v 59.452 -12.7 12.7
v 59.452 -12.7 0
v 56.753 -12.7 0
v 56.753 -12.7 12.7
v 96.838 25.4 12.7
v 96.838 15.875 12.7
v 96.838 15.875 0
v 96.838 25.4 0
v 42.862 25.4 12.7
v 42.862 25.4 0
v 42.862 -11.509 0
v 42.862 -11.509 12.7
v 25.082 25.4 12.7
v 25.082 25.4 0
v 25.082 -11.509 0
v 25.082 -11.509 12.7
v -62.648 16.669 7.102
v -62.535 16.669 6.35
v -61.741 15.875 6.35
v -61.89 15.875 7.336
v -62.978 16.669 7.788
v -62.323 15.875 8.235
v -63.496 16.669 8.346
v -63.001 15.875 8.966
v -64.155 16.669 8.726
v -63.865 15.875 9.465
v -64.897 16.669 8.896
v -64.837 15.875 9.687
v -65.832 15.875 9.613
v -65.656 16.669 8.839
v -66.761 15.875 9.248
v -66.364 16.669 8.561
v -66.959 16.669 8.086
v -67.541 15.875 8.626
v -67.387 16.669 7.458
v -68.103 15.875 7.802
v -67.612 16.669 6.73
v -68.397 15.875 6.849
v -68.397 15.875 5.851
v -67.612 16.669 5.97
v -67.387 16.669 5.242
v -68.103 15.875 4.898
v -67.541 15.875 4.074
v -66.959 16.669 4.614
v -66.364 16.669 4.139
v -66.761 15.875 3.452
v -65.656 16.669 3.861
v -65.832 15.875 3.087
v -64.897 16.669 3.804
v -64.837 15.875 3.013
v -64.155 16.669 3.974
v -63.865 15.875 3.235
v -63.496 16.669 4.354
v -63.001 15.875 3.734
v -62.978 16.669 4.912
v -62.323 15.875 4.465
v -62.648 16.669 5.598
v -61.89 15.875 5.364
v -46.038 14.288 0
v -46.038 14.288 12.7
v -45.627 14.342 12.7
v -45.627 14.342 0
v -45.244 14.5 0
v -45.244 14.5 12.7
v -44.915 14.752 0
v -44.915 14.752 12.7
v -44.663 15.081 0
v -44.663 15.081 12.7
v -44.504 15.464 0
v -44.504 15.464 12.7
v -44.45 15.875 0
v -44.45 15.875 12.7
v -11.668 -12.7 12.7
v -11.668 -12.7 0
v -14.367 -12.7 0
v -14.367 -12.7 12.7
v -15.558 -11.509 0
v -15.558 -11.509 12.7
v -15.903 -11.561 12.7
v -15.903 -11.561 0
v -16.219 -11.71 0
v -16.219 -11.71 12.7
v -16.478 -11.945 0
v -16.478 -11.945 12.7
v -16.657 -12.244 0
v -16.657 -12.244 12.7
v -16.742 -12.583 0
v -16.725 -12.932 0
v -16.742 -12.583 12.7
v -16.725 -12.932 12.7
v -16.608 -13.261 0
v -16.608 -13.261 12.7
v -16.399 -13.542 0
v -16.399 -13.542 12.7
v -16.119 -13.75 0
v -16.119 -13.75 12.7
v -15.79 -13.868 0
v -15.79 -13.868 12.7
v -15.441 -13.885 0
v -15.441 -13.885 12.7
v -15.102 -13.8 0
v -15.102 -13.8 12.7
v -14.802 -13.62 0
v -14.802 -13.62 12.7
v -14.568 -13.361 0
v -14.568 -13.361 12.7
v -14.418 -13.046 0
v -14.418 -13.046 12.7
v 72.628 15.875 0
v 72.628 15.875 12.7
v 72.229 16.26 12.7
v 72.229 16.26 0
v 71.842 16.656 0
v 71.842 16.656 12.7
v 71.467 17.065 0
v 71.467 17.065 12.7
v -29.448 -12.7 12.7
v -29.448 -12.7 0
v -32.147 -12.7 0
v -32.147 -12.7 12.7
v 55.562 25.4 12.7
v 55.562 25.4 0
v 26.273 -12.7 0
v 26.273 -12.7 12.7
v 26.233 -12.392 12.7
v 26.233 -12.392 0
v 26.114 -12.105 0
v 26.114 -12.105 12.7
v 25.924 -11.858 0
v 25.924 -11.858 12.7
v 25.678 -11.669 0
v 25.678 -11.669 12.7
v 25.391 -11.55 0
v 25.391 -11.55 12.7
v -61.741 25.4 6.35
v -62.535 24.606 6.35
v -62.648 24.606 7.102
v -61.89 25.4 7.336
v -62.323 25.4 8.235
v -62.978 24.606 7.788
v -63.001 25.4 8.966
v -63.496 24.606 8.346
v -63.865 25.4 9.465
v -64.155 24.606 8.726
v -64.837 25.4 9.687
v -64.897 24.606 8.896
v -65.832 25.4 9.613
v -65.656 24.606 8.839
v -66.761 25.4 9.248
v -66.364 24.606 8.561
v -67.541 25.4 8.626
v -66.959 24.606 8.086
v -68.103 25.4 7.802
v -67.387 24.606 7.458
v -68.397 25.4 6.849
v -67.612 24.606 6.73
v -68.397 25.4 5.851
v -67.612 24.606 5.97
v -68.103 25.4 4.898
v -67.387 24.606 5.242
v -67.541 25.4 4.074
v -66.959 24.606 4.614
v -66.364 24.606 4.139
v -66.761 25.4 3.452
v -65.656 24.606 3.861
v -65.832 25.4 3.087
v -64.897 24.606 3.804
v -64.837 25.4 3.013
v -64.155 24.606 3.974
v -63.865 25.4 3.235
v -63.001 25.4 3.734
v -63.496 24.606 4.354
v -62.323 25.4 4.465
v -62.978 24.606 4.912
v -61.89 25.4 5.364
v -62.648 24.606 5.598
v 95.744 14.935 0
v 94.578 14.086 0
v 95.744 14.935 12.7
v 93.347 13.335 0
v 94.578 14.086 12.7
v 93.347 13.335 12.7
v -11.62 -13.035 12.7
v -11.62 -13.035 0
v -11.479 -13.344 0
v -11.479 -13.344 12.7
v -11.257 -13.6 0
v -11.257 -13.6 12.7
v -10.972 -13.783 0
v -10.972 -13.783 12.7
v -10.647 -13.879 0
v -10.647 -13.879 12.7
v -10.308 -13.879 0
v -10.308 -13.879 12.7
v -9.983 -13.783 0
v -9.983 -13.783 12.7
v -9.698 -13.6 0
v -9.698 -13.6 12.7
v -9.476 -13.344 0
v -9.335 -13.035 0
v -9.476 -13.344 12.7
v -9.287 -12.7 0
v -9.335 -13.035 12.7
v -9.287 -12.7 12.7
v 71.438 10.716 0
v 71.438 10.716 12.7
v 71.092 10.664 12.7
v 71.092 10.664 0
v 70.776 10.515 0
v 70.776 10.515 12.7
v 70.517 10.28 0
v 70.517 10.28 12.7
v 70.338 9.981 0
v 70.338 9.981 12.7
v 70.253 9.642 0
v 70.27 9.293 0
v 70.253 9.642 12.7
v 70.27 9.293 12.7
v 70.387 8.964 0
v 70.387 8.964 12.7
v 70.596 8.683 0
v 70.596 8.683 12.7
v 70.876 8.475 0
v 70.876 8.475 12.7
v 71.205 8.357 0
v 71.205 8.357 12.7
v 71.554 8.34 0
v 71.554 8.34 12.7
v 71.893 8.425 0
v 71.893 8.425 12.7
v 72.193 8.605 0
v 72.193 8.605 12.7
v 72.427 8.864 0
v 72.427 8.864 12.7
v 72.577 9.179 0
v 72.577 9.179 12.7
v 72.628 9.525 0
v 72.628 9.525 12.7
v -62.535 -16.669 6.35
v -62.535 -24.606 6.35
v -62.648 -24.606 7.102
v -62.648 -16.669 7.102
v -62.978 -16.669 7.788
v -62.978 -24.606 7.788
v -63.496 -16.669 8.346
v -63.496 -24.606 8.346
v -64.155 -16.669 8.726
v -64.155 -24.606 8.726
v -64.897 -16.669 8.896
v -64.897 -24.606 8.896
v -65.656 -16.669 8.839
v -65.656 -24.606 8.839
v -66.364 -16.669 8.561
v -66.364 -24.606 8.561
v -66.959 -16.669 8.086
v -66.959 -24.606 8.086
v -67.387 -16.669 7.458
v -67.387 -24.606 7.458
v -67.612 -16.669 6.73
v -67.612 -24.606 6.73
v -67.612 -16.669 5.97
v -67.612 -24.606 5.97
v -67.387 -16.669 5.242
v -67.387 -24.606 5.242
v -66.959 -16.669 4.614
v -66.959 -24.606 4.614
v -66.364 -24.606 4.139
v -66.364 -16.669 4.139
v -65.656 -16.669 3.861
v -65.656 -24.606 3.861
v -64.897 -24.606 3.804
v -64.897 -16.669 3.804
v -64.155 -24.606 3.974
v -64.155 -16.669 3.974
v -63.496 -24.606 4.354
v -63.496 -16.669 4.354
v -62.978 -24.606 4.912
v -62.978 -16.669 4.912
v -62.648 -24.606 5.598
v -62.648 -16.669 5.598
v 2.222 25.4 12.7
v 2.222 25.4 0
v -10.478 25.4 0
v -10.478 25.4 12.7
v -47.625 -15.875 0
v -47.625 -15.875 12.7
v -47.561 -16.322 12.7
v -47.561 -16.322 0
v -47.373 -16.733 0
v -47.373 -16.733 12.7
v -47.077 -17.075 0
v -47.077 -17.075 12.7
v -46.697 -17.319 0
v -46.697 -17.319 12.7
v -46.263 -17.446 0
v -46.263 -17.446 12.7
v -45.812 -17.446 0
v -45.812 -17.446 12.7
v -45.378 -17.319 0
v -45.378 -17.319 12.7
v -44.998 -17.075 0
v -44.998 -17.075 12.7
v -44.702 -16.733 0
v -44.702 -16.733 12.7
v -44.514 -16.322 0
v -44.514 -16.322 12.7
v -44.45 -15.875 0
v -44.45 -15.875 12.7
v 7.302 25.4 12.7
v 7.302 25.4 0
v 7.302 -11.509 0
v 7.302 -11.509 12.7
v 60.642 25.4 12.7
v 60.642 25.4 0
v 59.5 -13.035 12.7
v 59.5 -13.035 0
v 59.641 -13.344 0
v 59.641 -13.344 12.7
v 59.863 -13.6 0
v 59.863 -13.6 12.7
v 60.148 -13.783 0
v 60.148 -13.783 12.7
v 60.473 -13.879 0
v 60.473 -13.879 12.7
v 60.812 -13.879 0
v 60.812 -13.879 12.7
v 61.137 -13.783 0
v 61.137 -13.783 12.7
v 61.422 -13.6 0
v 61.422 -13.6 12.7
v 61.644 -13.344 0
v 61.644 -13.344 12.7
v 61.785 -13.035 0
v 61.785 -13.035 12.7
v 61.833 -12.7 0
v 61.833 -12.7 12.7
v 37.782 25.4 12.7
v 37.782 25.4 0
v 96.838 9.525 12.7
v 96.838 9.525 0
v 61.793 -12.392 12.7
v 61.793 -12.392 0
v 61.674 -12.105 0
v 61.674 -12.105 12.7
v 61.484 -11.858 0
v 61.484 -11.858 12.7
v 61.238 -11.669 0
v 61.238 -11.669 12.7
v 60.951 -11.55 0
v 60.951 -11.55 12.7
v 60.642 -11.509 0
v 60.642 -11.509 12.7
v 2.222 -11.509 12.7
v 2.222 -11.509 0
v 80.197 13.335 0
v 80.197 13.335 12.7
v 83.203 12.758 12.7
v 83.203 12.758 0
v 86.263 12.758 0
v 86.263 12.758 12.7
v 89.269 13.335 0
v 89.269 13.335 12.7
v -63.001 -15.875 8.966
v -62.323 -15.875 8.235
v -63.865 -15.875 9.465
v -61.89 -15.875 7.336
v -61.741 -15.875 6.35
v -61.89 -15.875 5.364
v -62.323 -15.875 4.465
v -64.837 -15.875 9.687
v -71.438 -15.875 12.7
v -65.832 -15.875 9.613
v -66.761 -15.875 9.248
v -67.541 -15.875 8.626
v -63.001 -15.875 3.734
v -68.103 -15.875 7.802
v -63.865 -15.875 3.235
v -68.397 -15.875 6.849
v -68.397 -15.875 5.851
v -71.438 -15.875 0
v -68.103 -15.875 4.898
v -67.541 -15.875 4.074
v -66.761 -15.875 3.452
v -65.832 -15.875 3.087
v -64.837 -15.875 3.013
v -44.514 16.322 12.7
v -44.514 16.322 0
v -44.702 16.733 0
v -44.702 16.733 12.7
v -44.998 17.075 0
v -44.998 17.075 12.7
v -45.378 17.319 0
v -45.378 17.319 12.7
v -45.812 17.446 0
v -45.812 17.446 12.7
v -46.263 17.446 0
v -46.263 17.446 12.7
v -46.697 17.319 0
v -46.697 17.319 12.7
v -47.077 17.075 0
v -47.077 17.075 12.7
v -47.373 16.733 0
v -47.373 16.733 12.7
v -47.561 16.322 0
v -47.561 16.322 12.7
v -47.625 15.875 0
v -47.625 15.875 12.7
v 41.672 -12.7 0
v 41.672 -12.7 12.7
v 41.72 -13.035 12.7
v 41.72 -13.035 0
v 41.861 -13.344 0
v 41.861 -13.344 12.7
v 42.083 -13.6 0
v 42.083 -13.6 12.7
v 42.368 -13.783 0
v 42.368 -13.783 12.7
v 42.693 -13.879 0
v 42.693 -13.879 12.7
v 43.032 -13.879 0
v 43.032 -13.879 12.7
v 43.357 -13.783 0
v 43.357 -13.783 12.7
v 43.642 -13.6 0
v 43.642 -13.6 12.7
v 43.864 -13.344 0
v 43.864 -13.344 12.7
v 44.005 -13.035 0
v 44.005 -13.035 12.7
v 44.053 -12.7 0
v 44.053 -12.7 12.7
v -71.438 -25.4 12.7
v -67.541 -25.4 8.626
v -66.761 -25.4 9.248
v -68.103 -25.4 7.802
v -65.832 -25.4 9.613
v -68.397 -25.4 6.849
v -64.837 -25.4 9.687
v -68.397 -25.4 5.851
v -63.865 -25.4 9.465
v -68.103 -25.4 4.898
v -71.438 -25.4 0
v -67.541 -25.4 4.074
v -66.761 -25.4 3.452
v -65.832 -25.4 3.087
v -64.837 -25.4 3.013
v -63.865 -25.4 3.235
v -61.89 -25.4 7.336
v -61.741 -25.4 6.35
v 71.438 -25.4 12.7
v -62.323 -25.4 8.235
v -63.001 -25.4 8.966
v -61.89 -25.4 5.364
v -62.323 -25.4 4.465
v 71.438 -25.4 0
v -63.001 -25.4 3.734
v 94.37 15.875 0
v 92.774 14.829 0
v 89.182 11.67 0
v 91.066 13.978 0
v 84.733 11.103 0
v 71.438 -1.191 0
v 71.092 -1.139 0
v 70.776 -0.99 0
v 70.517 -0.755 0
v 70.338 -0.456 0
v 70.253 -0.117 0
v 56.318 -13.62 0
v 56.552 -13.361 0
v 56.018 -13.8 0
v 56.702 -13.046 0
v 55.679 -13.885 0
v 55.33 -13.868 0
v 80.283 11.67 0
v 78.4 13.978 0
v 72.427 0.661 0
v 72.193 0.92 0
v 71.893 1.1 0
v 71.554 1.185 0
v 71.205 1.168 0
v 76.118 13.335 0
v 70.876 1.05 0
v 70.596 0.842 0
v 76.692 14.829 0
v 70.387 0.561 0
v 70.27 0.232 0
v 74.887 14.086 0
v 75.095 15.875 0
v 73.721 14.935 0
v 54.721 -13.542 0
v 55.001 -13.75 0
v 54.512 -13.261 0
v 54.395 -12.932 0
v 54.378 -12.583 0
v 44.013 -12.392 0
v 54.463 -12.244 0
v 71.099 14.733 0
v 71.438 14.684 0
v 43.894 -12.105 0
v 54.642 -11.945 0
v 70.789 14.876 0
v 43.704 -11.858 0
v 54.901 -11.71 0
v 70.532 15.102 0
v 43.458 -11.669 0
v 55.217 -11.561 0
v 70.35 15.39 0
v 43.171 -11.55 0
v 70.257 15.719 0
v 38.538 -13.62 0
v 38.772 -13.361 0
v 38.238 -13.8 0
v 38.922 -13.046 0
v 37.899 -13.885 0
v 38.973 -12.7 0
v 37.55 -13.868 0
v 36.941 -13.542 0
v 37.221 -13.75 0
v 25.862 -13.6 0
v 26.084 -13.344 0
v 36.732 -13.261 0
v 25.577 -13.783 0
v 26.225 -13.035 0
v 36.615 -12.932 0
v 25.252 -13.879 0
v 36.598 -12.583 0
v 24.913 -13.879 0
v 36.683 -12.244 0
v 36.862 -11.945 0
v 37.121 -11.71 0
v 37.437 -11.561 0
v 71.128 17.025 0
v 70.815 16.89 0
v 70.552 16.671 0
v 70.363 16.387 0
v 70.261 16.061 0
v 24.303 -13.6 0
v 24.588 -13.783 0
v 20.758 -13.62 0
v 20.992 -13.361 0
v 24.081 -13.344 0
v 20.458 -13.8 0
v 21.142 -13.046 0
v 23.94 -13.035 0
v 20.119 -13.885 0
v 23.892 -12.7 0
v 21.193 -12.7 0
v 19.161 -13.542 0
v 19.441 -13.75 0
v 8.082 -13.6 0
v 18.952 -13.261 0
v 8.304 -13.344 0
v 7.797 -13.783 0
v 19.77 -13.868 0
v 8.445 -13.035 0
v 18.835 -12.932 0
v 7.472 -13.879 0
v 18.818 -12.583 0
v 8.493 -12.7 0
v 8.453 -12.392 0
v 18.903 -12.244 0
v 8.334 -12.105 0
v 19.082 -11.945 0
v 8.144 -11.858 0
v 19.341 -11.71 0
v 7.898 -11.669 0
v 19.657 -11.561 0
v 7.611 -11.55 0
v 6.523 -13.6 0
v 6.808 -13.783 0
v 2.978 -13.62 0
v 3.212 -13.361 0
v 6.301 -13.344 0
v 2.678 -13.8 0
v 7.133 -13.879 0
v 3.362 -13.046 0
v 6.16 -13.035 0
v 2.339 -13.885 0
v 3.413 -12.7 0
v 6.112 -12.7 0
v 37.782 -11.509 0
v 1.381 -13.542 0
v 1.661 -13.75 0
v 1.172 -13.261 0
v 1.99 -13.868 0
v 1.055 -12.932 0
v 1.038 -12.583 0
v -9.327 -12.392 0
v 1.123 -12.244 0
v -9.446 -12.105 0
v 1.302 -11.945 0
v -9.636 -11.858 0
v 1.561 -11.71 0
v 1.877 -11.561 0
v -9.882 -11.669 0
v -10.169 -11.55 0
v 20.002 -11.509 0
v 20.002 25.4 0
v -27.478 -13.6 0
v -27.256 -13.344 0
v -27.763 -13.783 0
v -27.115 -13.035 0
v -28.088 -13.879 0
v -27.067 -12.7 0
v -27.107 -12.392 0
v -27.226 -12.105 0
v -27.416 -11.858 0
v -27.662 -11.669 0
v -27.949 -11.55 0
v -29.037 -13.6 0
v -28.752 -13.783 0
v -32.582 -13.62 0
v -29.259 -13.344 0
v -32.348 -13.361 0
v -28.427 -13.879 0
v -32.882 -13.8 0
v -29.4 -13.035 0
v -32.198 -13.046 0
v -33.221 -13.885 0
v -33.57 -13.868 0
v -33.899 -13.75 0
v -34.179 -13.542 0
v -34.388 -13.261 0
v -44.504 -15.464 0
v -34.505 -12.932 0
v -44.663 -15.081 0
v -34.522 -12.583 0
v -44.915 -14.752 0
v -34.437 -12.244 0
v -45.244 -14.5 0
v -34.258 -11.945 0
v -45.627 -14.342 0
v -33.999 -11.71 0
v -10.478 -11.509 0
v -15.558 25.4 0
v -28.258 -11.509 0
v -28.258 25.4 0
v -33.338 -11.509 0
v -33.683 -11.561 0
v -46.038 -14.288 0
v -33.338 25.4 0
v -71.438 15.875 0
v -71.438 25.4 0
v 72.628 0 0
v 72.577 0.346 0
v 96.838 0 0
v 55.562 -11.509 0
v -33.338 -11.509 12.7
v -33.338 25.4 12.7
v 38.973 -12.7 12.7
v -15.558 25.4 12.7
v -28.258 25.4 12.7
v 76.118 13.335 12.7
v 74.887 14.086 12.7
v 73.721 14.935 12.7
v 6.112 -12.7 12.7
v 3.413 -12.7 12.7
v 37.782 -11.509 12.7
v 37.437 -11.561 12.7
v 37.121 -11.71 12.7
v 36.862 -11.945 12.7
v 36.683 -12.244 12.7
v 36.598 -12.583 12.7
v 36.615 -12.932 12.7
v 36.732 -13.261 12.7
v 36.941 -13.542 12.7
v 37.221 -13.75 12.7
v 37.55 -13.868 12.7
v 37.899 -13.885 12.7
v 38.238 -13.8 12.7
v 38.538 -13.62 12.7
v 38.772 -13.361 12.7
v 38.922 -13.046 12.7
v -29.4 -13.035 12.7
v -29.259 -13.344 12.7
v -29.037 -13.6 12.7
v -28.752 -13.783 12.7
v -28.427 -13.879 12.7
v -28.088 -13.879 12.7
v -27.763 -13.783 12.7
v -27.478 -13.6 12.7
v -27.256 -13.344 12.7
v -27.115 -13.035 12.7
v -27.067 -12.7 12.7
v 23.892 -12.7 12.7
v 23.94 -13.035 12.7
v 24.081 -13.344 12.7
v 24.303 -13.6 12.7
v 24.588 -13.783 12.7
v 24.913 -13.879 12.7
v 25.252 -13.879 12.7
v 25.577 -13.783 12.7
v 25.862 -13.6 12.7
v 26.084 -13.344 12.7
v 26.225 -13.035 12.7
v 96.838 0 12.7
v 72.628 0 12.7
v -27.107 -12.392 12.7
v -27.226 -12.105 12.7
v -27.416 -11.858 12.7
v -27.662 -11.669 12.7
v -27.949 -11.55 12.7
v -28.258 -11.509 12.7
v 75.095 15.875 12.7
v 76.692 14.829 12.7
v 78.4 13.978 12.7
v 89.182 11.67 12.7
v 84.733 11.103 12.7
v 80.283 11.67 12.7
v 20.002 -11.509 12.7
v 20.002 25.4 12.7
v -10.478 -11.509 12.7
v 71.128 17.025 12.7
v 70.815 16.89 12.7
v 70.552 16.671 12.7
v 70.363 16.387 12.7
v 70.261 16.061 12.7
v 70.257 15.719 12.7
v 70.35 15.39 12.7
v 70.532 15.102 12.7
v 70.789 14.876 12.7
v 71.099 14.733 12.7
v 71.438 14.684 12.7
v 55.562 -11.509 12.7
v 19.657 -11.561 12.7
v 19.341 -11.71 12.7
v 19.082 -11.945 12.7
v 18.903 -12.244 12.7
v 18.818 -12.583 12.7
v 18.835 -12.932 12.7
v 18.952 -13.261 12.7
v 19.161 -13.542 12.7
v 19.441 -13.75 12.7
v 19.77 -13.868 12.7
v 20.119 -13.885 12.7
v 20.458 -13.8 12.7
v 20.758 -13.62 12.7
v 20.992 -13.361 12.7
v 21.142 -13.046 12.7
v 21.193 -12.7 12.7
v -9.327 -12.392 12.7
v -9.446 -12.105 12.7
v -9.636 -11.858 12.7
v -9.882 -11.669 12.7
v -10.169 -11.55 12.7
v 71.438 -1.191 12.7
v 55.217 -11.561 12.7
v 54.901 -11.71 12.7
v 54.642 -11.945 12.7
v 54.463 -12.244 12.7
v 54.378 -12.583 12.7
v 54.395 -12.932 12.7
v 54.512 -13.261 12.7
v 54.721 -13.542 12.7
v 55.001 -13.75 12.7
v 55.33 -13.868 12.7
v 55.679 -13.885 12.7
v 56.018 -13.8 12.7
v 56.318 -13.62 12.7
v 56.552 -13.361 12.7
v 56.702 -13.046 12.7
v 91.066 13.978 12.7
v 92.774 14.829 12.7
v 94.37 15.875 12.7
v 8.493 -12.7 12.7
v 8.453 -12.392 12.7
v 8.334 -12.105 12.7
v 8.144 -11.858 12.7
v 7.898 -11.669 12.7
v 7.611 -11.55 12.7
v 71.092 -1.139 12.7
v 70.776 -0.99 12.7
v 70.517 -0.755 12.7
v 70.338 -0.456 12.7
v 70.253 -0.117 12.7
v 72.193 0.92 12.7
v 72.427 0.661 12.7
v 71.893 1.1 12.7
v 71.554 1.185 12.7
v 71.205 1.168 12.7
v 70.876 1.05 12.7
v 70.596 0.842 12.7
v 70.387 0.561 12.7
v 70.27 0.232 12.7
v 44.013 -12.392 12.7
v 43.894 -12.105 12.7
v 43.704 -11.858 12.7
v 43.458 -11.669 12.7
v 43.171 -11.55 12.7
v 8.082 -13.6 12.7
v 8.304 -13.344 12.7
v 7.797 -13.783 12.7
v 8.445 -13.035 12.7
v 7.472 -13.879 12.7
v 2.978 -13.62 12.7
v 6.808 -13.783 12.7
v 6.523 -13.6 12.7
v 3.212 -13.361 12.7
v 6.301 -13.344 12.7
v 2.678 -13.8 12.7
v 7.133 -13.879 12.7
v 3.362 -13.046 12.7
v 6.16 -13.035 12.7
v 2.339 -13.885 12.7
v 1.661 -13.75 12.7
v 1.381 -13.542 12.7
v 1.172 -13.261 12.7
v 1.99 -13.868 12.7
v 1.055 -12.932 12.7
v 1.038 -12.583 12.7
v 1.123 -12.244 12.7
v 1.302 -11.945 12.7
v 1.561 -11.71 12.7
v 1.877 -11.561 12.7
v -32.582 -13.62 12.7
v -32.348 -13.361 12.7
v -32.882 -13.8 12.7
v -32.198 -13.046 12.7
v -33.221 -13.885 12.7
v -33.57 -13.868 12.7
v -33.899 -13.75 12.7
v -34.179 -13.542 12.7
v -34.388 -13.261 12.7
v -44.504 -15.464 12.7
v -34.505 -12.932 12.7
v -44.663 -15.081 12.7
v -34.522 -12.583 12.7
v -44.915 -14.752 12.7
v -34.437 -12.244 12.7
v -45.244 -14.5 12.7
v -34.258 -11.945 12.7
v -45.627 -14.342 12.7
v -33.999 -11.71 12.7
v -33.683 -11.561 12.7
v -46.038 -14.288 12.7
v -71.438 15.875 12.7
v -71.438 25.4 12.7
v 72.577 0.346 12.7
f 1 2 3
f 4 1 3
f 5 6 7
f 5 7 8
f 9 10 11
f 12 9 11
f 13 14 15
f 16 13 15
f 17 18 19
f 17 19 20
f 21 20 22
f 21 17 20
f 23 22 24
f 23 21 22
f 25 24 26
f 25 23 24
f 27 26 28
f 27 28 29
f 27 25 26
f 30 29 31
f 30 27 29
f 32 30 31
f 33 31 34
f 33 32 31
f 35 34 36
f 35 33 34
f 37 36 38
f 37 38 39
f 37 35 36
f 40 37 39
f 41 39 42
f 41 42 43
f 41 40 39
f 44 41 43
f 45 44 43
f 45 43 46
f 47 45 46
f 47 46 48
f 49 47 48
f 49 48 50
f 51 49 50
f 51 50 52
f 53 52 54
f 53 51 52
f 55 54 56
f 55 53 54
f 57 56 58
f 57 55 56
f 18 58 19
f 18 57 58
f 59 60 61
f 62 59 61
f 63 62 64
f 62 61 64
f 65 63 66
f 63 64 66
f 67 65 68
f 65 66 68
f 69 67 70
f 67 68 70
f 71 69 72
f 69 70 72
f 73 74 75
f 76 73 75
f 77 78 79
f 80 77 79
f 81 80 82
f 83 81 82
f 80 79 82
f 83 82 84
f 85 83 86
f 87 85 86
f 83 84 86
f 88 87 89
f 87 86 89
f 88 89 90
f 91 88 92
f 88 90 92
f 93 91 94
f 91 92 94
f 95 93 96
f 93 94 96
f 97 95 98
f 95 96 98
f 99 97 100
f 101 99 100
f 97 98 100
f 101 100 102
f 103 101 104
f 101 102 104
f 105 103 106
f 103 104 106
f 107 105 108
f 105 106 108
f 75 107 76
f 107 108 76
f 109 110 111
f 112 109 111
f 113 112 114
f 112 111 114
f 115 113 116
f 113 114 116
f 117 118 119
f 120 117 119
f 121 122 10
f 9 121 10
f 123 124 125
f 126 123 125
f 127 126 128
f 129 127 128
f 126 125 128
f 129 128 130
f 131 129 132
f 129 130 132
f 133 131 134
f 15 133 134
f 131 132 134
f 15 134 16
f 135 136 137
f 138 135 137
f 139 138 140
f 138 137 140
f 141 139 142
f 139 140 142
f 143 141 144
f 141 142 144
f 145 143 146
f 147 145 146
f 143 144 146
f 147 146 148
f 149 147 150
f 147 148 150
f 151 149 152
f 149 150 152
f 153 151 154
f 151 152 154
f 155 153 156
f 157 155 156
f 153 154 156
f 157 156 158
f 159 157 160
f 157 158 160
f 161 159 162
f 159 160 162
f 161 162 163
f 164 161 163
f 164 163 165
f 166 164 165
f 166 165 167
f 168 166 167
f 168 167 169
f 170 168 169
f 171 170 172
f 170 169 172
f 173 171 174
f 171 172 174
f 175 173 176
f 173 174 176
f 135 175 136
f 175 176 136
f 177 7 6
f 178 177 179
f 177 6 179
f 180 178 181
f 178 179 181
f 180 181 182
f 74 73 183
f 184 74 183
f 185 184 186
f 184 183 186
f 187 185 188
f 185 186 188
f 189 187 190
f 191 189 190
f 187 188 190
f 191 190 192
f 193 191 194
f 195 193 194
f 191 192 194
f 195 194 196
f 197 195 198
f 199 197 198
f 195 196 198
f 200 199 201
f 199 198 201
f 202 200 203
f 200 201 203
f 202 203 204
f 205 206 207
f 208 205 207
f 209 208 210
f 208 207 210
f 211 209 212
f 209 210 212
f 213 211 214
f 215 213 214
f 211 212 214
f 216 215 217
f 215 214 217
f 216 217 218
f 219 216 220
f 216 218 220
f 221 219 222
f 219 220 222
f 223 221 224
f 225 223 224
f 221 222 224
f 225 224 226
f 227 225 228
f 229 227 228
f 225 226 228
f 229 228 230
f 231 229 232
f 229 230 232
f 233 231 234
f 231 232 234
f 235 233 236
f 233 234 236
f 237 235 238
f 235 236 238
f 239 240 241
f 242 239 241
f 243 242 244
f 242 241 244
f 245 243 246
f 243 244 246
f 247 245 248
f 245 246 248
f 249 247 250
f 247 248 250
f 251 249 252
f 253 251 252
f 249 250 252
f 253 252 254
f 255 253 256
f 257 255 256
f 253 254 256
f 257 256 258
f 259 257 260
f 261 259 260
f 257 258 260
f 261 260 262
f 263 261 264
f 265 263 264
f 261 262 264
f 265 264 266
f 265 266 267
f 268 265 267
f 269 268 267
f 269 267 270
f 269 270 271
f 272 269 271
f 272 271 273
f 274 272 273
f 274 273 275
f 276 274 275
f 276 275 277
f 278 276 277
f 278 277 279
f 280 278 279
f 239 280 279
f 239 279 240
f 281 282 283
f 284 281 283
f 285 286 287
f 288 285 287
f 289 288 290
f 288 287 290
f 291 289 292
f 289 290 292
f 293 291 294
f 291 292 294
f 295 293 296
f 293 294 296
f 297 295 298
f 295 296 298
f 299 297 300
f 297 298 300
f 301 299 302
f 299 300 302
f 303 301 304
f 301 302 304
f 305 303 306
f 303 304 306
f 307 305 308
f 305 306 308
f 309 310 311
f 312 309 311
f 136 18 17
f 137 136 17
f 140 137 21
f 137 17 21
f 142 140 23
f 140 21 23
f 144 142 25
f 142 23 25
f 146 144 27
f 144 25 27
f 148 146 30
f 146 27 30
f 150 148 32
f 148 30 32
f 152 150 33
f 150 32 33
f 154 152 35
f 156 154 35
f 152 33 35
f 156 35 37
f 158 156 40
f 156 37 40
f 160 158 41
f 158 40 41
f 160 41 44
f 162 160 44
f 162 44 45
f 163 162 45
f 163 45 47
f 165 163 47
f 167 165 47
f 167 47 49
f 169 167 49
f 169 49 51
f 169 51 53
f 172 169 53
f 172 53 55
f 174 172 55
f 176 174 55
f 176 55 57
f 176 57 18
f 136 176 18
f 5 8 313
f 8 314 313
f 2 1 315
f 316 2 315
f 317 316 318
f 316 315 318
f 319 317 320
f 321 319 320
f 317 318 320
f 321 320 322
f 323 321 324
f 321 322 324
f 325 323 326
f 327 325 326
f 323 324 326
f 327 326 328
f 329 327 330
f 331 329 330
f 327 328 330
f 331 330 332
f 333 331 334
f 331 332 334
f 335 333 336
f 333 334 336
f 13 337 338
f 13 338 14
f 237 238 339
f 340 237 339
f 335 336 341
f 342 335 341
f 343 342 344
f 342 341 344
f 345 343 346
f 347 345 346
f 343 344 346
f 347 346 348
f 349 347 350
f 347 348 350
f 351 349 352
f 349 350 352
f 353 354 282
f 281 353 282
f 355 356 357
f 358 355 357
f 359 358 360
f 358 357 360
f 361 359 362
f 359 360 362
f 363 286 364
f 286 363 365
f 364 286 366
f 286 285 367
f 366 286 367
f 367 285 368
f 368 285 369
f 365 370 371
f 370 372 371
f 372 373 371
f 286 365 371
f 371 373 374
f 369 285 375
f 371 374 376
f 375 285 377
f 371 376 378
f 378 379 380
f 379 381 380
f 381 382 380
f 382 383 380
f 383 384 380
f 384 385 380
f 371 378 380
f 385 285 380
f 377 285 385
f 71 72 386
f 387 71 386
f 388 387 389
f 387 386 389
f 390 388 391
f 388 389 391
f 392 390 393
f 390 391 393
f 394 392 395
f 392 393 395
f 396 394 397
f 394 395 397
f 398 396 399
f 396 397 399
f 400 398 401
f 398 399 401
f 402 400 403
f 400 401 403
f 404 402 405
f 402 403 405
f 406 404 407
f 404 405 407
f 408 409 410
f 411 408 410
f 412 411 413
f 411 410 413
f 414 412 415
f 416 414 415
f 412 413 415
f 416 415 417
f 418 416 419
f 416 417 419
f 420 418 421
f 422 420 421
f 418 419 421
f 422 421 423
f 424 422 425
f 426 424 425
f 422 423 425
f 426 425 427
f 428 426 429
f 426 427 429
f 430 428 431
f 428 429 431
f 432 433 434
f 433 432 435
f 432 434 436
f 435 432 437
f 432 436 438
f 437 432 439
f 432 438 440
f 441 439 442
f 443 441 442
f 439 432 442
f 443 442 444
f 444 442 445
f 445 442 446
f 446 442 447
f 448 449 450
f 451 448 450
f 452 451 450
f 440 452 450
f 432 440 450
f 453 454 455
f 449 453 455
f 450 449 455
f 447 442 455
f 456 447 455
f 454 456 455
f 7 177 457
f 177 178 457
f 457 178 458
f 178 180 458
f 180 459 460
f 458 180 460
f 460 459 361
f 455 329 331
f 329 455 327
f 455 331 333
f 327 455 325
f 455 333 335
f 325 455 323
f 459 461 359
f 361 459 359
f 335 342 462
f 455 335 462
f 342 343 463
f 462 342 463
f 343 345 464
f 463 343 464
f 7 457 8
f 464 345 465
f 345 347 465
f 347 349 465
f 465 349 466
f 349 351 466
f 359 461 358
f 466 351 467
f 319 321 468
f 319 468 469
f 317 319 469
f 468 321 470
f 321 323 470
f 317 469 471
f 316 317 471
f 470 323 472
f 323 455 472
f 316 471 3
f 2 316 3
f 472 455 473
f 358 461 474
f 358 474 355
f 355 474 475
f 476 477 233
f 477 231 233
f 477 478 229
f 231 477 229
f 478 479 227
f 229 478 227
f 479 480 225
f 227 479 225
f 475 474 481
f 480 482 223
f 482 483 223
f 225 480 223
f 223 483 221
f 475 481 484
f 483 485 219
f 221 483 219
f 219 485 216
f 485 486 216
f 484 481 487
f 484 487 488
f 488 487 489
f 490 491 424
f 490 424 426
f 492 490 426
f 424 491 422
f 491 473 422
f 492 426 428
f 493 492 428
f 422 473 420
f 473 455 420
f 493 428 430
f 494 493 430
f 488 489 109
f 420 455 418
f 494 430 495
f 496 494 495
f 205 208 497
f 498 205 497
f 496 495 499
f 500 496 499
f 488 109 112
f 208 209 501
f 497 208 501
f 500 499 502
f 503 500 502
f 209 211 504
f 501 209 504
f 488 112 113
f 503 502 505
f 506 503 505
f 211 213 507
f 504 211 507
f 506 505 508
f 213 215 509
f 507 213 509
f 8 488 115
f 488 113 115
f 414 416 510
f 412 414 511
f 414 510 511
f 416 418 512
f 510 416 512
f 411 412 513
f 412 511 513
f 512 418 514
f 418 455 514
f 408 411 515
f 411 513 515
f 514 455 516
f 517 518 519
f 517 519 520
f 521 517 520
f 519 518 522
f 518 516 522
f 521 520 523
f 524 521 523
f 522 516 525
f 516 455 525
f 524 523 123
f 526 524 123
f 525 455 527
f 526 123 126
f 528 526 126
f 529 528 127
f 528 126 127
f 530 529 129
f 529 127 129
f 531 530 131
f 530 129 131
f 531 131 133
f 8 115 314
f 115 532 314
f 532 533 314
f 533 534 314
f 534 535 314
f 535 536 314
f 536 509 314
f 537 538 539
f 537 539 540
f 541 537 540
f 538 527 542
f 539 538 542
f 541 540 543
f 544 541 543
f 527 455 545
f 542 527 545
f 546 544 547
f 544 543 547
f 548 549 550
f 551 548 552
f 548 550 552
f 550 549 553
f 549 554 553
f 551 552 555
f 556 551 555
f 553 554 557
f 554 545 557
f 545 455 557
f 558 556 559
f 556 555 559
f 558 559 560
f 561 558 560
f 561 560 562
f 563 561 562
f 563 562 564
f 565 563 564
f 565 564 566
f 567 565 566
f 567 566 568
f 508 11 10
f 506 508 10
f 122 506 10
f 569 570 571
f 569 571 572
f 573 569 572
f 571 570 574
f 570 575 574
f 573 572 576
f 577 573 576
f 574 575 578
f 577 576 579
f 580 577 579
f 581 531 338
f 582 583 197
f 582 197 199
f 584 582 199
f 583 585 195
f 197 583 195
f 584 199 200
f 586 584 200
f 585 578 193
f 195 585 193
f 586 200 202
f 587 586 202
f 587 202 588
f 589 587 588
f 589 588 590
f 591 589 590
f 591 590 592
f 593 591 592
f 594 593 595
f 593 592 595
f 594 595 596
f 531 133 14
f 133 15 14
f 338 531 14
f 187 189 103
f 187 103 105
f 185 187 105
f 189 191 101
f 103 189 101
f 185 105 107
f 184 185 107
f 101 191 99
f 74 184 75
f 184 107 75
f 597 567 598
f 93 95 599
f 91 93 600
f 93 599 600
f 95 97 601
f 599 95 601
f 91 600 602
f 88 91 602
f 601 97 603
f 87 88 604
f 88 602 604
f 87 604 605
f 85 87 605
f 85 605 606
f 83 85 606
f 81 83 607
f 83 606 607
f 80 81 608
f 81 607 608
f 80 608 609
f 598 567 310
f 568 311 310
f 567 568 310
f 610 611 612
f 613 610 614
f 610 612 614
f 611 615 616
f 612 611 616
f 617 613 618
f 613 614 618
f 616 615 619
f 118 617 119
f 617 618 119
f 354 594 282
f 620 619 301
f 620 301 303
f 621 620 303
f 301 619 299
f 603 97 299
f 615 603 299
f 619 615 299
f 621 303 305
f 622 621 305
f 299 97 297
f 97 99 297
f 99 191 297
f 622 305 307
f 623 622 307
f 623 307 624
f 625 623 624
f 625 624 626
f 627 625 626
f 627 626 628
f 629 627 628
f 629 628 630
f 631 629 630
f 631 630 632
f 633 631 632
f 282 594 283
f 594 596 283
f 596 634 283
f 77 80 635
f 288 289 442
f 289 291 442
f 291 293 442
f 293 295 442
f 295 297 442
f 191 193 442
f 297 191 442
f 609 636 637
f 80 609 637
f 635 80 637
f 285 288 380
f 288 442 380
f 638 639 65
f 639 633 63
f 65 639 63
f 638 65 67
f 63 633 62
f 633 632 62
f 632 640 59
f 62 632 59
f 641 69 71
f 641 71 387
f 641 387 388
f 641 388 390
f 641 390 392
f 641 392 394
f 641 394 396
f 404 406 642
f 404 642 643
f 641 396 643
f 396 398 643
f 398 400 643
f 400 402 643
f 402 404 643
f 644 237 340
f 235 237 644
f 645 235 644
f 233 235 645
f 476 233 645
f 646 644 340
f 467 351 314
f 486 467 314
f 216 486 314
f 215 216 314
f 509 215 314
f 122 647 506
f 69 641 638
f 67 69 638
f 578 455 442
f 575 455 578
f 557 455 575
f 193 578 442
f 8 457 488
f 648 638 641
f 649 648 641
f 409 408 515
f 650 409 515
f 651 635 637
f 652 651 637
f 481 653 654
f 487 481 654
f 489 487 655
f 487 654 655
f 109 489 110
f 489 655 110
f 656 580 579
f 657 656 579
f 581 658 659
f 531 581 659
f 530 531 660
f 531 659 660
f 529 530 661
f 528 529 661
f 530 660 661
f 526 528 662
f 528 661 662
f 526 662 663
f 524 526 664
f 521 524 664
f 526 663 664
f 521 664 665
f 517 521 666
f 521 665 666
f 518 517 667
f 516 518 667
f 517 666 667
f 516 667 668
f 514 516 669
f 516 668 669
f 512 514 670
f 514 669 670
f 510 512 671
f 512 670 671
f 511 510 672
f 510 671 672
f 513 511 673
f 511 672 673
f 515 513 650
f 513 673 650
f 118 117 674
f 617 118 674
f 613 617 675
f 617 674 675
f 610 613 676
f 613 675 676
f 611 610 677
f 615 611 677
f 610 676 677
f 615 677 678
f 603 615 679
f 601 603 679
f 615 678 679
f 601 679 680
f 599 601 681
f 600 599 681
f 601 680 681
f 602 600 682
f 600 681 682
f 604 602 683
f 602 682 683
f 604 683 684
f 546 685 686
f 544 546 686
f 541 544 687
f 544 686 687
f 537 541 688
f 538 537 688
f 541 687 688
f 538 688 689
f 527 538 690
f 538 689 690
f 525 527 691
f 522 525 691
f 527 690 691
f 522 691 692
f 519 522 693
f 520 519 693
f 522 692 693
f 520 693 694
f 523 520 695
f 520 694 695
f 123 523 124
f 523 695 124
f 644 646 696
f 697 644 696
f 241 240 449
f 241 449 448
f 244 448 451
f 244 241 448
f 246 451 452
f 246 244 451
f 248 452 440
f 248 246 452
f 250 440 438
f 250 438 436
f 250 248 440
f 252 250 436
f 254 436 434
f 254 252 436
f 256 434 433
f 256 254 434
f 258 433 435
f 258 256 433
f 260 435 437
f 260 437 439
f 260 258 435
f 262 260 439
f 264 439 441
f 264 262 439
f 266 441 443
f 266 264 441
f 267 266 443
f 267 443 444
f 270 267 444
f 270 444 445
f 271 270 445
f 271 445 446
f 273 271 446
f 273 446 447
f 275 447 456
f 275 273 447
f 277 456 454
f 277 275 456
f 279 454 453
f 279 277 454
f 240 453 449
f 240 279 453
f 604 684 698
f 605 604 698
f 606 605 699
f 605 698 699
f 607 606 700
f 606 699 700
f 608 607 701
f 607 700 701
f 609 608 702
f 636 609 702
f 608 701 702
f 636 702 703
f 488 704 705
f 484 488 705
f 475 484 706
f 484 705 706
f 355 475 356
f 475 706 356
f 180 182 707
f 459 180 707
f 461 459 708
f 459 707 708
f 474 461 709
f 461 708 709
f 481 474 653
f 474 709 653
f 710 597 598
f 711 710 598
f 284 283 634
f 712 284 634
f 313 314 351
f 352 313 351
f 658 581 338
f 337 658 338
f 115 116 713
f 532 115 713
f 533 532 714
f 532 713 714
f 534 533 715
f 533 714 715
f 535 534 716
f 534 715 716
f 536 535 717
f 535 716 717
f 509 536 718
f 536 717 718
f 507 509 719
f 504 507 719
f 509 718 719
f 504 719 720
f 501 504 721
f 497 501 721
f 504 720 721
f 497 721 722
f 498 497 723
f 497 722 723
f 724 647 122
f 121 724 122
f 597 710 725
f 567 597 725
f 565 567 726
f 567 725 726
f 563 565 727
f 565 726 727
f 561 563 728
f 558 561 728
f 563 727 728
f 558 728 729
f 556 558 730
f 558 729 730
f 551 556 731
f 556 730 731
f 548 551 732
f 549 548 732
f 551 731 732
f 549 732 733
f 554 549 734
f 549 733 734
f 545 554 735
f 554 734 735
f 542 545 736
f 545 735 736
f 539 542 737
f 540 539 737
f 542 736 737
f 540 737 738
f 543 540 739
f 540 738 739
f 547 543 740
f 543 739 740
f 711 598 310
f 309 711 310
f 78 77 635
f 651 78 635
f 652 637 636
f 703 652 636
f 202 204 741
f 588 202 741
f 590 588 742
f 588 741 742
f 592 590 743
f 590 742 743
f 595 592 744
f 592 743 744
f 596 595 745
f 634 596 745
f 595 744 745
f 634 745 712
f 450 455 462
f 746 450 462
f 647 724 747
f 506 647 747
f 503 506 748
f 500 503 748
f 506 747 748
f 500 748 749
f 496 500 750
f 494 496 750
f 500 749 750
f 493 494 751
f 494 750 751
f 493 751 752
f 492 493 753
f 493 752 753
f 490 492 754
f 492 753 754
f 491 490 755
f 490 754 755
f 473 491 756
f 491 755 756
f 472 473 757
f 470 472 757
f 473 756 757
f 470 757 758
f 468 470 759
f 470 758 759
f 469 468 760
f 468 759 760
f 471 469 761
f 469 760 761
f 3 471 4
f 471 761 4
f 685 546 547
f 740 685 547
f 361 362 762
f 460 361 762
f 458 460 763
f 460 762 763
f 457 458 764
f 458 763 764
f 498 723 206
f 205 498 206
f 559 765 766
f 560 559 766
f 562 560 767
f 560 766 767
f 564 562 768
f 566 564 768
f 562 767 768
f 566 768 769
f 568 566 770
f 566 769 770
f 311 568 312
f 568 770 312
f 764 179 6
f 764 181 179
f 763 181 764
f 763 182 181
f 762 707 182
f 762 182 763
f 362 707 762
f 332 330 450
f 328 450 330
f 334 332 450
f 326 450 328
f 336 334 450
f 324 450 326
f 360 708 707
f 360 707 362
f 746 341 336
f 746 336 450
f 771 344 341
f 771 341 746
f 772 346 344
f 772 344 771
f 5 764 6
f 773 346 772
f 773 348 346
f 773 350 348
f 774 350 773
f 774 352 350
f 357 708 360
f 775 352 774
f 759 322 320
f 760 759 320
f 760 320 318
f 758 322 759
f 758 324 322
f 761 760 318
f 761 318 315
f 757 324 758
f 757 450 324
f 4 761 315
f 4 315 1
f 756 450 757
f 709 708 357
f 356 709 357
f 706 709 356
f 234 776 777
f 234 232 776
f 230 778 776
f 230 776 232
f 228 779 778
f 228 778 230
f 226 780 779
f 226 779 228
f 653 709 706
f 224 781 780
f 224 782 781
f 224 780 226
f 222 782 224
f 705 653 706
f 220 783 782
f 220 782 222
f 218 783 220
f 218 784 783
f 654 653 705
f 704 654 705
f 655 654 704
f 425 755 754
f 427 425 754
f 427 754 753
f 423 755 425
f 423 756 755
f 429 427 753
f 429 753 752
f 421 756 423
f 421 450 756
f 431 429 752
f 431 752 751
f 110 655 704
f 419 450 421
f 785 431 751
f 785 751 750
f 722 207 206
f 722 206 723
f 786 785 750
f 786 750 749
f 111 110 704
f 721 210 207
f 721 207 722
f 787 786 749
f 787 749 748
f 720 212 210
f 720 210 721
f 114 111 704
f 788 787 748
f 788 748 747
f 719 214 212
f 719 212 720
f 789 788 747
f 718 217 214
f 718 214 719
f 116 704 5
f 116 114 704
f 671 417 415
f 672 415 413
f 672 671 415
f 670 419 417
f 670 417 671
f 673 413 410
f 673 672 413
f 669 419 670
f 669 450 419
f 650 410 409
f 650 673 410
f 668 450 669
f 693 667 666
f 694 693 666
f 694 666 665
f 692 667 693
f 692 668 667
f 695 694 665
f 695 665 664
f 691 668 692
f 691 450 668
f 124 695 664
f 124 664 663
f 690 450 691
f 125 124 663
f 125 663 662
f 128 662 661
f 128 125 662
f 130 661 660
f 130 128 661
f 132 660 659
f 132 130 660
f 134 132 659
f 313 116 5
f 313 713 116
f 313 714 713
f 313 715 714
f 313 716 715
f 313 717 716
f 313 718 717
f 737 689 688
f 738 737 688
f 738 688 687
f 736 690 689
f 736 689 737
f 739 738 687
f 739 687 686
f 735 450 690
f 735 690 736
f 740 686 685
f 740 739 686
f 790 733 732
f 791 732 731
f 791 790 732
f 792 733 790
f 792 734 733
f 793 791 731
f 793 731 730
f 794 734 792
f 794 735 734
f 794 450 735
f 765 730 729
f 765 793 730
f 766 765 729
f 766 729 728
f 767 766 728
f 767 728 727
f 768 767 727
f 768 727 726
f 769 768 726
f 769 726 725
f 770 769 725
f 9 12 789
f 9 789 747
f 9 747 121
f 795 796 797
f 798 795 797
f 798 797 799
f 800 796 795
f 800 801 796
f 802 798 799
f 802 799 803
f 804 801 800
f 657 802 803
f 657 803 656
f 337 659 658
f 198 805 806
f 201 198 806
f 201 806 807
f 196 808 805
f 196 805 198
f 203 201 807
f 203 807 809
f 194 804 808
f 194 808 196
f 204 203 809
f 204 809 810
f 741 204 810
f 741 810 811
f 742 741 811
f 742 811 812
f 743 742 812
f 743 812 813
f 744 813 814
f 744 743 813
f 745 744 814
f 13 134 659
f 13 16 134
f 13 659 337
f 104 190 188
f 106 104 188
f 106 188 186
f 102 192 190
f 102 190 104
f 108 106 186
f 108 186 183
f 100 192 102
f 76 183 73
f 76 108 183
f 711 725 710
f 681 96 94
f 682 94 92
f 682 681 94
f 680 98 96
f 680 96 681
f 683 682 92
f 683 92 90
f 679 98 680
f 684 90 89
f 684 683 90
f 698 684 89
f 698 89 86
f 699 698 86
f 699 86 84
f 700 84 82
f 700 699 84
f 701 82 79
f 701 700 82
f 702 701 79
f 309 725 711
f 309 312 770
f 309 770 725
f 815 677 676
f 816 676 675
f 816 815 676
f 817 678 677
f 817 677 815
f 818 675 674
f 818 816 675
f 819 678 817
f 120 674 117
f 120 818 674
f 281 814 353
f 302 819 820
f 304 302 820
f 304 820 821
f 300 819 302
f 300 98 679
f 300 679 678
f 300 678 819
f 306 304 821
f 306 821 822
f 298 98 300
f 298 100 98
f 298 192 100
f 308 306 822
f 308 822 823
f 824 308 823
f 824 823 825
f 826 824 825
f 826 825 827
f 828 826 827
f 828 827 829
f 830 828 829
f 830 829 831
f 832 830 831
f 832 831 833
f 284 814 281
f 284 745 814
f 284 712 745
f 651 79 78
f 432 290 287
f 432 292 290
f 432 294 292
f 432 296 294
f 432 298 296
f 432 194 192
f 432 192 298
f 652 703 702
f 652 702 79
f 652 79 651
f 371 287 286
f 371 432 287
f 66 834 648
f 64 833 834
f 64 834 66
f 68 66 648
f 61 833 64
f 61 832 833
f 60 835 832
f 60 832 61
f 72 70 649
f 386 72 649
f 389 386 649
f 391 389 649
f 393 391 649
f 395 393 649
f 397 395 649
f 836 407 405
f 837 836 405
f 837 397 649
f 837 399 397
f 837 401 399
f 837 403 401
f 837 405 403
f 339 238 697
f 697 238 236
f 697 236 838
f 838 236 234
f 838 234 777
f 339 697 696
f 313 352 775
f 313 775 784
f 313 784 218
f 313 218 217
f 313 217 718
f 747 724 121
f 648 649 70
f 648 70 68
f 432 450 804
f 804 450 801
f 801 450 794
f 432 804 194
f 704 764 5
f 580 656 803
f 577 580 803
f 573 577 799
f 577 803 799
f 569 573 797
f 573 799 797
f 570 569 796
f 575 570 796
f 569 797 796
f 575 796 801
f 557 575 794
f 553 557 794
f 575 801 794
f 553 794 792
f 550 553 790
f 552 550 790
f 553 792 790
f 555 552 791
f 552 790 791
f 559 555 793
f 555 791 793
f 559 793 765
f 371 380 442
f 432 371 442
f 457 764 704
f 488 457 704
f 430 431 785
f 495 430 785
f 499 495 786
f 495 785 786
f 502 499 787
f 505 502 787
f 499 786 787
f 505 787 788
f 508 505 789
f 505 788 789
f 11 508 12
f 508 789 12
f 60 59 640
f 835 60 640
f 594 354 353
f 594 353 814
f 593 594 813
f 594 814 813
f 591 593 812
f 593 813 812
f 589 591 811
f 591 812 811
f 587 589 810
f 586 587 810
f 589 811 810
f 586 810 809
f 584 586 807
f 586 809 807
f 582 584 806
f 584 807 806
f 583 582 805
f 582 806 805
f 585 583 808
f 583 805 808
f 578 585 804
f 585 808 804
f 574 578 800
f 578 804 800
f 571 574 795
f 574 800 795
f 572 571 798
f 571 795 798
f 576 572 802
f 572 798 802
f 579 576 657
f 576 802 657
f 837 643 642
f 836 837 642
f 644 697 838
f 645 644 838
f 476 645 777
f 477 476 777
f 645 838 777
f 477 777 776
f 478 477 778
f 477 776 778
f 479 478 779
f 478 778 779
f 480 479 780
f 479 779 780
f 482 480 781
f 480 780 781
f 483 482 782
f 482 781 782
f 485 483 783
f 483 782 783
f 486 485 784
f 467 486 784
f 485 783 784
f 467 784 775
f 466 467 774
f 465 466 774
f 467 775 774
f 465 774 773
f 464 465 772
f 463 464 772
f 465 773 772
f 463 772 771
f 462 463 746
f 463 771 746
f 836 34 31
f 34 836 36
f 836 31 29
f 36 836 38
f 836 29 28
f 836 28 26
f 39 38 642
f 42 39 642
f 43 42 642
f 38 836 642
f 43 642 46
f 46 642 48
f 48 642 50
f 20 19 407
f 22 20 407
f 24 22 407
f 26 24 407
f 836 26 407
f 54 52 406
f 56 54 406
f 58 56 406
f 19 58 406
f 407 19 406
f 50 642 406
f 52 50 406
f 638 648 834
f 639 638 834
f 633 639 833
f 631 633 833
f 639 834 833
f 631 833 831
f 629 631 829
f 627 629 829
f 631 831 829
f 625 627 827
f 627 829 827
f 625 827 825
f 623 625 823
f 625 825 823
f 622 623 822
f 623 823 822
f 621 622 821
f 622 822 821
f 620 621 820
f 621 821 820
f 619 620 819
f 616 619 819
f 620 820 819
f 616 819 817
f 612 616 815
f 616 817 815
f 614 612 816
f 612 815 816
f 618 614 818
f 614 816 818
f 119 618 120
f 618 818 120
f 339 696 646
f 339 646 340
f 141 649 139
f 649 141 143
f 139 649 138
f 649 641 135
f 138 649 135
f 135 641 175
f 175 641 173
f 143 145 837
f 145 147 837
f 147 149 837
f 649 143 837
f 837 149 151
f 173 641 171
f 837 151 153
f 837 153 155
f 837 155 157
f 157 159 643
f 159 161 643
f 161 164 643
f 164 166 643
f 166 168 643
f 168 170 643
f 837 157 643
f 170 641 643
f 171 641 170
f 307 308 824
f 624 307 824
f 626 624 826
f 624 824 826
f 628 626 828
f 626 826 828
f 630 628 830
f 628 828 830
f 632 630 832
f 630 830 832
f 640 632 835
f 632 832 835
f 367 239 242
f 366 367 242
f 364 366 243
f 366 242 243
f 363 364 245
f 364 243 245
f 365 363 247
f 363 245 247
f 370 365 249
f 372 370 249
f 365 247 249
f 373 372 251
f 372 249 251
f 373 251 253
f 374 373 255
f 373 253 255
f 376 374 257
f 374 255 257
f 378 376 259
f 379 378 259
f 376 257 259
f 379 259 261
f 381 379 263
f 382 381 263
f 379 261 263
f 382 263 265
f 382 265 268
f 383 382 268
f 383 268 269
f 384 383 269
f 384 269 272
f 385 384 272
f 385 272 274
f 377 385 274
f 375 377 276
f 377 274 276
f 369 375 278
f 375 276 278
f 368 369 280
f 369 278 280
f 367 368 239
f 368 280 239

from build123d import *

# Parameters (mm, degrees)
F0_DEPTH = 12.7
F1_R     = 2.5527
F2_DEPTH = 50.801
F3_SIZE  = 0.79375
F5_DEPTH = 12.701
F6_DEPTH = 12.7
F7_W     = 25.4
F7_H     = 12.7
F8_DEPTH = 25.4
F9_DEPTH = 12.7


# Not quite as in the source:
# - a feature names something its author has since deleted; it is built from what else it names


with BuildPart() as f0:
    # F10 (on Top) → F0 (new body)
    with BuildSketch(Plane.XY):
        Polygon((-71.4375, -15.875), (-71.4375, -25.4), (71.4375, -25.4), (71.4375, 25.4), (60.6425, 25.4), (60.6425, -12.7), (55.5625, -12.7), (55.5625, 25.4), (42.8625, 25.4), (42.8625, -12.7), (37.7825, -12.7), (37.7825, 25.4), (25.0825, 25.4), (25.0825, -12.7), (20.0025, -12.7), (20.0025, 25.4), (7.3025, 25.4), (7.3025, -12.7), (2.2225, -12.7), (2.2225, 25.4), (-10.4775, 25.4), (-10.4775, -12.7), (-15.5575, -12.7), (-15.5575, 25.4), (-28.2575, 25.4), (-28.2575, -12.7), (-33.3375, -12.7), (-33.3375, 25.4), (-71.4375, 25.4), (-71.4375, 15.875), (-46.0375, 15.875), (-46.0375, -15.875), align=None)
    extrude(amount=F0_DEPTH)

    # F1 (on face) → F2 (cut, through all)
    with BuildSketch(Plane.XZ.offset(25.4)):
        with Locations((-65.0875, 6.35)):
            Circle(F1_R)
    extrude(amount=-F2_DEPTH, mode=Mode.SUBTRACT)

    # F3
    f3_edges = [f0.edges().sort_by_distance(p)[0] for p in [
        (-67.6402, 15.875, 6.35),
        (-62.5348, 20.6375, 6.35),
        (-67.6402, 25.4, 6.35),
        (-67.6402, -25.4, 6.35),
        (-62.5348, -20.6375, 6.35),
        (-67.6402, -15.875, 6.35),
    ]]
    chamfer(f3_edges, length=F3_SIZE)

    # F4 (on face) → F5 (cut, through all)
    with BuildSketch(Plane.XY.offset(12.7)):
        with BuildLine():
            ThreePointArc((-46.0375, 14.2875), (-44.9149679849, 14.7524679849), (-44.45, 15.875))
            ThreePointArc((-44.45, 15.875), (-46.0375, 17.4625), (-47.625, 15.875))
            Line((-47.625, 15.875), (-46.0375, 15.875))
            Line((-46.0375, 15.875), (-46.0375, 14.2875))
        make_face()
        with BuildLine():
            ThreePointArc((-44.45, -15.875), (-44.9149679849, -14.7524679849), (-46.0375, -14.2875))
            Line((-46.0375, -14.2875), (-46.0375, -15.875))
            Line((-46.0375, -15.875), (-47.625, -15.875))
            ThreePointArc((-47.625, -15.875), (-46.0375, -17.4625), (-44.45, -15.875))
        make_face()
    extrude(amount=-F5_DEPTH, mode=Mode.SUBTRACT)

    # F4 (on face) → F6 (cut, through all)
    with BuildSketch(Plane.XY.offset(12.7)):
        with BuildLine():
            Line((-33.3375, -12.7), (-33.3375, -11.509375))
            ThreePointArc((-33.3375, -11.509375), (-34.1793990114, -13.5418990114), (-32.146875, -12.7))
            Line((-32.146875, -12.7), (-33.3375, -12.7))
        make_face()
        with BuildLine():
            Line((-28.2575, -12.7), (-29.448125, -12.7))
            ThreePointArc((-29.448125, -12.7), (-28.2575, -13.890625), (-27.066875, -12.7))
            ThreePointArc((-27.066875, -12.7), (-27.4156009886, -11.8581009886), (-28.2575, -11.509375))
            Line((-28.2575, -11.509375), (-28.2575, -12.7))
        make_face()
        with BuildLine():
            Line((-15.5575, -12.7), (-15.5575, -11.509375))
            ThreePointArc((-15.5575, -11.509375), (-16.3993990114, -13.5418990114), (-14.366875, -12.7))
            Line((-14.366875, -12.7), (-15.5575, -12.7))
        make_face()
        with BuildLine():
            Line((-10.4775, -12.7), (-11.668125, -12.7))
            ThreePointArc((-11.668125, -12.7), (-10.4775, -13.890625), (-9.286875, -12.7))
            ThreePointArc((-9.286875, -12.7), (-9.6356009886, -11.8581009886), (-10.4775, -11.509375))
            Line((-10.4775, -11.509375), (-10.4775, -12.7))
        make_face()
        with BuildLine():
            Line((2.2225, -12.7), (2.2225, -11.509375))
            ThreePointArc((2.2225, -11.509375), (1.3806009886, -13.5418990114), (3.413125, -12.7))
            Line((3.413125, -12.7), (2.2225, -12.7))
        make_face()
        with BuildLine():
            Line((7.3025, -12.7), (6.111875, -12.7))
            ThreePointArc((6.111875, -12.7), (7.3025, -13.890625), (8.493125, -12.7))
            ThreePointArc((8.493125, -12.7), (8.1443990114, -11.8581009886), (7.3025, -11.509375))
            Line((7.3025, -11.509375), (7.3025, -12.7))
        make_face()
        with BuildLine():
            Line((20.0025, -12.7), (20.0025, -11.509375))
            ThreePointArc((20.0025, -11.509375), (19.1606009886, -13.5418990114), (21.193125, -12.7))
            Line((21.193125, -12.7), (20.0025, -12.7))
        make_face()
        with BuildLine():
            ThreePointArc((26.273125, -12.7), (25.9243990114, -11.8581009886), (25.0825, -11.509375))
            Line((25.0825, -11.509375), (25.0825, -12.7))
            Line((25.0825, -12.7), (23.891875, -12.7))
            ThreePointArc((23.891875, -12.7), (25.0825, -13.890625), (26.273125, -12.7))
        make_face()
        with BuildLine():
            ThreePointArc((37.7825, -11.509375), (36.9406009886, -13.5418990114), (38.973125, -12.7))
            Line((38.973125, -12.7), (37.7825, -12.7))
            Line((37.7825, -12.7), (37.7825, -11.509375))
        make_face()
        with BuildLine():
            ThreePointArc((44.053125, -12.7), (43.7043990114, -11.8581009886), (42.8625, -11.509375))
            Line((42.8625, -11.509375), (42.8625, -12.7))
            Line((42.8625, -12.7), (41.671875, -12.7))
            ThreePointArc((41.671875, -12.7), (42.8625, -13.890625), (44.053125, -12.7))
        make_face()
        with BuildLine():
            ThreePointArc((55.5625, -11.509375), (54.7206009886, -13.5418990114), (56.753125, -12.7))
            Line((56.753125, -12.7), (55.5625, -12.7))
            Line((55.5625, -12.7), (55.5625, -11.509375))
        make_face()
        with BuildLine():
            ThreePointArc((61.833125, -12.7), (61.4843990114, -11.8581009886), (60.6425, -11.509375))
            Line((60.6425, -11.509375), (60.6425, -12.7))
            Line((60.6425, -12.7), (59.451875, -12.7))
            ThreePointArc((59.451875, -12.7), (60.6425, -13.890625), (61.833125, -12.7))
        make_face()
    extrude(amount=-F6_DEPTH, mode=Mode.SUBTRACT)

    # F7 (on face) → F8 (join)
    with BuildSketch(Plane.YZ.offset(71.4375)):
        with Locations((12.7, 6.35)):
            Rectangle(F7_W, F7_H)
    extrude(amount=F8_DEPTH)

    # F11 (on face) → F9 (cut, through all)
    with BuildSketch(Plane.XY.offset(12.7)):
        with BuildLine():
            Line((71.4375, 10.715625), (71.4375, 9.525))
            Line((71.4375, 9.525), (72.628125, 9.525))
            ThreePointArc((72.628125, 9.525), (72.2793990114, 10.3668990114), (71.4375, 10.715625))
        make_face()
        with BuildLine():
            Line((72.628125, 9.525), (71.4375, 9.525))
            Line((71.4375, 9.525), (71.4375, 10.715625))
            ThreePointArc((71.4375, 10.715625), (70.5956009886, 8.6831009886), (72.628125, 9.525))
        make_face()
        with BuildLine():
            ThreePointArc((71.4375, 10.715625), (72.2793990114, 10.3668990114), (72.628125, 9.525))
            Line((72.628125, 9.525), (96.8375, 9.525))
            Line((96.8375, 9.525), (96.8375, 13.335))
            Line((96.8375, 13.335), (93.3474382109, 13.335))
            ThreePointArc((93.3474382109, 13.335), (84.7328125, 11.1025068978), (76.1181867891, 13.335))
            Line((76.1181867891, 13.335), (71.4375, 13.335))
            Line((71.4375, 13.335), (71.4375, 10.715625))
        make_face()
        with BuildLine():
            Line((71.4375, 14.684375), (71.4375, 13.335))
            Line((71.4375, 13.335), (76.1181867891, 13.335))
            ThreePointArc((76.1181867891, 13.335), (74.2956009479, 14.4984363954), (72.628125, 15.875))
            ThreePointArc((72.628125, 15.875), (72.2793990114, 15.0331009886), (71.4375, 14.684375))
        make_face()
        with BuildLine():
            Line((93.3474382109, 13.335), (96.8375, 13.335))
            Line((96.8375, 13.335), (96.8375, 15.875))
            ThreePointArc((96.8375, 15.875), (95.1700240521, 14.4984363954), (93.3474382109, 13.335))
        make_face()
        with BuildLine():
            ThreePointArc((71.4674857978, 17.0652473451), (70.2469694175, 15.8899940879), (71.4375, 14.684375))
            Line((71.4375, 14.684375), (71.4375, 15.875))
            Line((71.4375, 15.875), (72.628125, 15.875))
            ThreePointArc((72.628125, 15.875), (72.0338528048, 16.4565181579), (71.4674857978, 17.0652473451))
        make_face()
        with BuildLine():
            Line((71.4375, 15.875), (71.4375, 14.684375))
            ThreePointArc((71.4375, 14.684375), (72.2793990114, 15.0331009886), (72.628125, 15.875))
            Line((72.628125, 15.875), (71.4375, 15.875))
        make_face()
        with BuildLine():
            Line((71.4375, 0), (72.628125, 0))
            ThreePointArc((72.628125, 0), (70.5956009886, 0.8418990114), (71.4375, -1.190625))
            Line((71.4375, -1.190625), (71.4375, 0))
        make_face()
        with BuildLine():
            ThreePointArc((75.0951666073, 15.875), (77.5332428869, 14.378226663), (80.1971168511, 13.335))
            Line((80.1971168511, 13.335), (89.2685081489, 13.335))
            ThreePointArc((89.2685081489, 13.335), (91.9323821131, 14.378226663), (94.3704583927, 15.875))
            Line((94.3704583927, 15.875), (75.0951666073, 15.875))
        make_face()
        with BuildLine():
            Line((89.2685081489, 13.335), (80.1971168511, 13.335))
            ThreePointArc((80.1971168511, 13.335), (84.7328125, 12.6851833333), (89.2685081489, 13.335))
        make_face()
    extrude(amount=-F9_DEPTH, mode=Mode.SUBTRACT)


solid = f0.part
